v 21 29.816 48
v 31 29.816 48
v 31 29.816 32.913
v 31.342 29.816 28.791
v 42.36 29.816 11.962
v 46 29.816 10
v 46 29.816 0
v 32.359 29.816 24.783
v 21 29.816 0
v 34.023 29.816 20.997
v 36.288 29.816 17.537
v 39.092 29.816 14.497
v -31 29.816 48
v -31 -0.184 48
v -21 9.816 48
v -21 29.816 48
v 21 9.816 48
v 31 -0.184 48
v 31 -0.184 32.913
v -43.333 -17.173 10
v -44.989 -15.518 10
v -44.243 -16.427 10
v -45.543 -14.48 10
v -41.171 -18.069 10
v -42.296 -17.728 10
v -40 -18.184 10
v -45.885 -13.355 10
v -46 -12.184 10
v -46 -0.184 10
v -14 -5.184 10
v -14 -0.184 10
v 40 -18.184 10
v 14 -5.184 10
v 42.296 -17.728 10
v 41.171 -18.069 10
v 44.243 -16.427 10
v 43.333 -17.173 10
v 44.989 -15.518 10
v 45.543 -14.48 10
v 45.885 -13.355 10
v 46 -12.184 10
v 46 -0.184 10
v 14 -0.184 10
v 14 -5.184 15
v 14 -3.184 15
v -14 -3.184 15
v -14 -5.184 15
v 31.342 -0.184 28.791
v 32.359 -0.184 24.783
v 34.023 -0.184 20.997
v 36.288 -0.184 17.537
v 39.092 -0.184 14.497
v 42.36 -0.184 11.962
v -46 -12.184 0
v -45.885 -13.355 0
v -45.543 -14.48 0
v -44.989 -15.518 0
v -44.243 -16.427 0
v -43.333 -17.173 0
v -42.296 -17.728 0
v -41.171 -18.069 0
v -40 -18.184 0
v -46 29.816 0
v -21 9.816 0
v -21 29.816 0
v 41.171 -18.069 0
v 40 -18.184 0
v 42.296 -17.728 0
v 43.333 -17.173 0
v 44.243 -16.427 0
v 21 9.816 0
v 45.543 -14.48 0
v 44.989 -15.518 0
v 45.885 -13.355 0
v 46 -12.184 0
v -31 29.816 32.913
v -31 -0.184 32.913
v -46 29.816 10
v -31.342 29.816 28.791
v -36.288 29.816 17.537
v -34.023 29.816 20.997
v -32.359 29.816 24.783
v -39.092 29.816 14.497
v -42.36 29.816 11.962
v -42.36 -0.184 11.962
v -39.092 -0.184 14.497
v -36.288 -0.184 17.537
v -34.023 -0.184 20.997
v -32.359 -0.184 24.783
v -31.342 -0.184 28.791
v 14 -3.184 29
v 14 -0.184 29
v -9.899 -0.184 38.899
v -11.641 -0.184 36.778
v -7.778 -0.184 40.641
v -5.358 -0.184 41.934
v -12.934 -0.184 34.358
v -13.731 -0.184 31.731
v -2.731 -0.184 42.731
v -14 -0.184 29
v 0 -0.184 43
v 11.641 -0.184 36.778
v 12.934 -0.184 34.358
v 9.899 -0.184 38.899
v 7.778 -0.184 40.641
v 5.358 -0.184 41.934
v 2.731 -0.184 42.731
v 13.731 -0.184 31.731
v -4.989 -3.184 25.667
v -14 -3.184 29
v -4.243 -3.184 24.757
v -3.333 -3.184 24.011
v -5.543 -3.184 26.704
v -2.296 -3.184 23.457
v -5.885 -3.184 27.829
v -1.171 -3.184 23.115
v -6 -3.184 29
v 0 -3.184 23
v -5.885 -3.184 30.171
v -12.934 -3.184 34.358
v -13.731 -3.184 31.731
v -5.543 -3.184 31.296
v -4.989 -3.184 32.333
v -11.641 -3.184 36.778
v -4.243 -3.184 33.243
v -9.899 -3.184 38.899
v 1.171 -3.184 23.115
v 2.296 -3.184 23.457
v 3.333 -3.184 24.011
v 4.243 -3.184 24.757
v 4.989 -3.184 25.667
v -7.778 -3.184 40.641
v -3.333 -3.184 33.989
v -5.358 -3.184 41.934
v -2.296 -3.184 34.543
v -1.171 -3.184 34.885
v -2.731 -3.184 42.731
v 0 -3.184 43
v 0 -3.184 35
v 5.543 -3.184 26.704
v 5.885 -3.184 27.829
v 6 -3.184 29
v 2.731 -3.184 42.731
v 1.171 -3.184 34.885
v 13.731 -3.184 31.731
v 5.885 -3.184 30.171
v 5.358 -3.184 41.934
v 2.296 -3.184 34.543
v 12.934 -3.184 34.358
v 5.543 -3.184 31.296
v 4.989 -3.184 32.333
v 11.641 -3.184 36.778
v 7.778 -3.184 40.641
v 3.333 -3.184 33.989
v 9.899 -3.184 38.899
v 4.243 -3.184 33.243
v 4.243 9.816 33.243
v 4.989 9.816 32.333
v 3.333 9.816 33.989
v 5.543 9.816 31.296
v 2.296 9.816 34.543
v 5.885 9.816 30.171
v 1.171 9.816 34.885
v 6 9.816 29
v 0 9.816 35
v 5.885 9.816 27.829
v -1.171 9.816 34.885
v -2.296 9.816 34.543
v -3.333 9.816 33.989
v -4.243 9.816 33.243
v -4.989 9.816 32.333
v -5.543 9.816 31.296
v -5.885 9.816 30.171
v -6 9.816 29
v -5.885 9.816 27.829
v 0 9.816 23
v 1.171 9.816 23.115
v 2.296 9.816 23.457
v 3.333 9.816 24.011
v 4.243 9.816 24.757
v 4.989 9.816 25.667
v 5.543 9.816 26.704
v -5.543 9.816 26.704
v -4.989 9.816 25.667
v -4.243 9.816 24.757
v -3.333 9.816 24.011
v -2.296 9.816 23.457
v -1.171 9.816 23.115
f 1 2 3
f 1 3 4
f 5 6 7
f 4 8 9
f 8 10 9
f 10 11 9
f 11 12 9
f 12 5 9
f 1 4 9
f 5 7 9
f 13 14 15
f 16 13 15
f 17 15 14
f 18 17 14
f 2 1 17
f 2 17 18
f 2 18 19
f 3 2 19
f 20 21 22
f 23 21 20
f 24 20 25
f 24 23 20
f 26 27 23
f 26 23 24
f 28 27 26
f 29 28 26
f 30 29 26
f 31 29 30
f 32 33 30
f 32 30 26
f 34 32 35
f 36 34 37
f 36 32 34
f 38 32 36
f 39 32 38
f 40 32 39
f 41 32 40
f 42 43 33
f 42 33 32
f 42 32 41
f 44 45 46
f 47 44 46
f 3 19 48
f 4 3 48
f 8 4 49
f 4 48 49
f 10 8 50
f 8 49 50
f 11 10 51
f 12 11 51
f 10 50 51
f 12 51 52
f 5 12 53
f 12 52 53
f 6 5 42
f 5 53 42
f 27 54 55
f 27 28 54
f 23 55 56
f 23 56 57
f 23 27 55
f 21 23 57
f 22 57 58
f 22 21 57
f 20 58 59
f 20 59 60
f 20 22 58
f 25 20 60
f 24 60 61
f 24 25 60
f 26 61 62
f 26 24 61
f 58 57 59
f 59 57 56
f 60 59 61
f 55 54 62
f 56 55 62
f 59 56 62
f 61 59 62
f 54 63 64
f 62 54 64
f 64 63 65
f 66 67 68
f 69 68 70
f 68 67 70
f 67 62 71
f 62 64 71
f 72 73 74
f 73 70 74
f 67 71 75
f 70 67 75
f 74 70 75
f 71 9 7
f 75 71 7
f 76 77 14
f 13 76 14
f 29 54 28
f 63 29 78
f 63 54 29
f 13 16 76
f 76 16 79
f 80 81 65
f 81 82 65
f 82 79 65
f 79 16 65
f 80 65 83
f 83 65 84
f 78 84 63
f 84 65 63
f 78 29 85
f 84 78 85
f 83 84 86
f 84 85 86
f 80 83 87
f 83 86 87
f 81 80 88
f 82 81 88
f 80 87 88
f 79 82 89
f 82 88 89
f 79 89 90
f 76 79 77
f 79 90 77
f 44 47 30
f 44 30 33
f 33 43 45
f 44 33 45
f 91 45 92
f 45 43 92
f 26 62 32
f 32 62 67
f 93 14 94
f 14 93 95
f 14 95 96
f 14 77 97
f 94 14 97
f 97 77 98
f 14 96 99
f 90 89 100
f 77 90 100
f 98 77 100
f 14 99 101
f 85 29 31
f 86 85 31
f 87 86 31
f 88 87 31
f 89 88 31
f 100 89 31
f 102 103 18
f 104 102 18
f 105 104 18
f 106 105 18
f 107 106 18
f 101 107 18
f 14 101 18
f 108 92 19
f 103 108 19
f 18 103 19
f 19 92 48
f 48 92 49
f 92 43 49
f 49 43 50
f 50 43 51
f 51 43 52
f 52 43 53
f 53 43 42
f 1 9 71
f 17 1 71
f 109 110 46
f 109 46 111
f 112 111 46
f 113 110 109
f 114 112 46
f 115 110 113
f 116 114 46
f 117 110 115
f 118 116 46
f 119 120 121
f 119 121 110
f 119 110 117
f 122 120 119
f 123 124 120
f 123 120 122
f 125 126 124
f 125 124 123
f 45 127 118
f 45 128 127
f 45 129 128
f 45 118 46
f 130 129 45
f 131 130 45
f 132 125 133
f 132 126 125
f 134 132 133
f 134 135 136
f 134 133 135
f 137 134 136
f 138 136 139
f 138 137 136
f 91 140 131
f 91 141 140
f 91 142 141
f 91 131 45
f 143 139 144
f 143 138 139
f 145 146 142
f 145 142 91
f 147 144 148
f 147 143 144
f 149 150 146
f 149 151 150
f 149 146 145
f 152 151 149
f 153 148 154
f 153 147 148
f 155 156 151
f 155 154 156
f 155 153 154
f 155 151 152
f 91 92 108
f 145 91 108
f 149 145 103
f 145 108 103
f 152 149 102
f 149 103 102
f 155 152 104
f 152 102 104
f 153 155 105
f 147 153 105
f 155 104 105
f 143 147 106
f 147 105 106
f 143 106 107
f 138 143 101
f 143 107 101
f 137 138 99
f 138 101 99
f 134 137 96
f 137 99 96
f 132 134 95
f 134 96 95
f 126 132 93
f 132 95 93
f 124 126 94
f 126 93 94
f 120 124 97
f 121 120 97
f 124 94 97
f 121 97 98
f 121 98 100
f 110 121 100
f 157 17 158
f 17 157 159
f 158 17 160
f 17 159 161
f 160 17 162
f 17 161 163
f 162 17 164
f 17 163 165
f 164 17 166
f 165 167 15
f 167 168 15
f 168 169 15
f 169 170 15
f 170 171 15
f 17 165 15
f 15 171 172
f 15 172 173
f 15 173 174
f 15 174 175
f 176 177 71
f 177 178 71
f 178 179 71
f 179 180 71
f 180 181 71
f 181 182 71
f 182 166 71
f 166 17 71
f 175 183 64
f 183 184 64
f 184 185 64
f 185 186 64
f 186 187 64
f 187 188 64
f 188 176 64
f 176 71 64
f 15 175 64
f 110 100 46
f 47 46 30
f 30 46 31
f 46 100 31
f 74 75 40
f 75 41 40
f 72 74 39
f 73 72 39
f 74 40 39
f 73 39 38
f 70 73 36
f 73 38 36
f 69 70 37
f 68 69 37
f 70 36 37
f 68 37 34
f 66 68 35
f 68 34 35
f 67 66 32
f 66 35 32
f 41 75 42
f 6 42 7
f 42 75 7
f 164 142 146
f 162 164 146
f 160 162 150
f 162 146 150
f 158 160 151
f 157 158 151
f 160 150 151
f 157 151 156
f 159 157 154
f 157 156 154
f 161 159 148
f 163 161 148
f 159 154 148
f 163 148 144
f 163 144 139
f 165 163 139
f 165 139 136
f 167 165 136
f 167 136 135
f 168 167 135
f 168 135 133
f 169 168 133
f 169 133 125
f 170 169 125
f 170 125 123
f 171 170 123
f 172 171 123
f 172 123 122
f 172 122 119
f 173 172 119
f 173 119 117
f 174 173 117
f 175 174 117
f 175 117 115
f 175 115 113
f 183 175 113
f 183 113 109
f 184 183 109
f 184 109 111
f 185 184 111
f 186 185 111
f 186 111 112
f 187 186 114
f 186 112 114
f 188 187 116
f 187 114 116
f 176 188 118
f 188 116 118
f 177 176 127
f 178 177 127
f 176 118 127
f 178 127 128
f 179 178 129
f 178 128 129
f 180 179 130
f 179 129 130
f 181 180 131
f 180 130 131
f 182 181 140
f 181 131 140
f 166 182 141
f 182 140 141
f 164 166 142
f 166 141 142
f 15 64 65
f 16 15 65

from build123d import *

# Parameters (mm, degrees)
F1_DEPTH = 48
F0_W     = 92
F0_H     = 18
F2_DEPTH = 10
F4_DEPTH = 63
F6_DEPTH = 5
F7_DEPTH = 3
F8_R     = 6
F9_DEPTH = 55.6
F10_R    = 6


with BuildPart() as f1:
    # F0 (on Top) → F1 (new body)
    with BuildSketch(Plane.XY):
        Polygon((-31, 29.8156050886), (-46, 29.8156050886), (-46, -0.1843949114), (46, -0.1843949114), (46, 29.8156050886), (31, 29.8156050886), (21, 29.8156050886), (21, 9.8156050886), (-21, 9.8156050886), (-21, 29.8156050886), align=None)
    extrude(amount=F1_DEPTH)

    # F0 (on Top) → F2 (join)
    with BuildSketch(Plane.XY):
        with Locations((0, -9.1843949114)):
            Rectangle(F0_W, F0_H)
    extrude(amount=F2_DEPTH)

    # F3 (on face) → F4 (cut)
    with BuildSketch(Plane.XZ.offset(0.1843949114)):
        with BuildLine():
            Line((-31, 32.9128784748), (-31, 48))
            Line((-31, 48), (-36.0656386086, 48))
            ThreePointArc((-36.0656386086, 48), (-32.3002211531, 40.8702953048), (-31, 32.9128784748))
        make_face()
        with BuildLine():
            ThreePointArc((-46, 10), (-35.0834993366, 19.2198145372), (-31, 32.9128784748))
            ThreePointArc((-31, 32.9128784748), (-32.3002211531, 40.8702953048), (-36.0656386086, 48))
            Line((-36.0656386086, 48), (-46, 48))
            Line((-46, 48), (-46, 10))
        make_face()
        with BuildLine():
            Line((36.0656386086, 48), (31, 48))
            Line((31, 48), (31, 32.9128784748))
            ThreePointArc((31, 32.9128784748), (32.3002211531, 40.8702953048), (36.0656386086, 48))
        make_face()
        with BuildLine():
            ThreePointArc((36.0656386086, 48), (32.3002211531, 40.8702953048), (31, 32.9128784748))
            ThreePointArc((31, 32.9128784748), (35.0834993366, 19.2198145372), (46, 10))
            Line((46, 10), (46, 48))
            Line((46, 48), (36.0656386086, 48))
        make_face()
        with BuildLine():
            ThreePointArc((81, 32.9128784748), (63.9574168301, 56.6126573217), (36.0656386086, 48))
            Line((36.0656386086, 48), (46, 48))
            Line((46, 48), (46, 10))
            ThreePointArc((46, 10), (69.6930639376, 11.9963778114), (81, 32.9128784748))
        make_face()
    extrude(amount=-F4_DEPTH, mode=Mode.SUBTRACT)

    # F5 (on face) → F6 (join)
    with BuildSketch(Plane.XZ.offset(0.1843949114)):
        Polygon((14, 15), (0, 15), (-14, 15), (-14, 10), (14, 10), align=None)
    extrude(amount=F6_DEPTH)

    # F5 (on face) → F7 (join)
    with BuildSketch(Plane.XZ.offset(0.1843949114)):
        with BuildLine():
            Line((0, 29), (14, 29))
            ThreePointArc((14, 29), (0, 43), (-14, 29))
            Line((-14, 29), (0, 29))
        make_face()
        with BuildLine():
            ThreePointArc((0, 15), (9.8994949366, 19.1005050634), (14, 29))
            Line((14, 29), (0, 29))
            Line((0, 29), (-14, 29))
            ThreePointArc((-14, 29), (-9.8994949366, 19.1005050634), (0, 15))
        make_face()
        with BuildLine():
            Line((14, 15), (14, 29))
            ThreePointArc((14, 29), (9.8994949366, 19.1005050634), (0, 15))
            Line((0, 15), (14, 15))
        make_face()
        with BuildLine():
            ThreePointArc((0, 15), (-9.8994949366, 19.1005050634), (-14, 29))
            Line((-14, 29), (-14, 15))
            Line((-14, 15), (0, 15))
        make_face()
    extrude(amount=F7_DEPTH)

    # F8 (on face) → F9 (cut)
    with BuildSketch(Plane.XZ.offset(3.1843949114)):
        with Locations((0, 29)):
            Circle(F8_R)
    extrude(amount=-F9_DEPTH, mode=Mode.SUBTRACT)

    # F10
    f10_edges = [f1.edges().sort_by_distance(p)[0] for p in [
        (-46, -18.184395, 5),
        (46, -18.184395, 5),
    ]]
    fillet(f10_edges, radius=F10_R)


solid = f1.part
